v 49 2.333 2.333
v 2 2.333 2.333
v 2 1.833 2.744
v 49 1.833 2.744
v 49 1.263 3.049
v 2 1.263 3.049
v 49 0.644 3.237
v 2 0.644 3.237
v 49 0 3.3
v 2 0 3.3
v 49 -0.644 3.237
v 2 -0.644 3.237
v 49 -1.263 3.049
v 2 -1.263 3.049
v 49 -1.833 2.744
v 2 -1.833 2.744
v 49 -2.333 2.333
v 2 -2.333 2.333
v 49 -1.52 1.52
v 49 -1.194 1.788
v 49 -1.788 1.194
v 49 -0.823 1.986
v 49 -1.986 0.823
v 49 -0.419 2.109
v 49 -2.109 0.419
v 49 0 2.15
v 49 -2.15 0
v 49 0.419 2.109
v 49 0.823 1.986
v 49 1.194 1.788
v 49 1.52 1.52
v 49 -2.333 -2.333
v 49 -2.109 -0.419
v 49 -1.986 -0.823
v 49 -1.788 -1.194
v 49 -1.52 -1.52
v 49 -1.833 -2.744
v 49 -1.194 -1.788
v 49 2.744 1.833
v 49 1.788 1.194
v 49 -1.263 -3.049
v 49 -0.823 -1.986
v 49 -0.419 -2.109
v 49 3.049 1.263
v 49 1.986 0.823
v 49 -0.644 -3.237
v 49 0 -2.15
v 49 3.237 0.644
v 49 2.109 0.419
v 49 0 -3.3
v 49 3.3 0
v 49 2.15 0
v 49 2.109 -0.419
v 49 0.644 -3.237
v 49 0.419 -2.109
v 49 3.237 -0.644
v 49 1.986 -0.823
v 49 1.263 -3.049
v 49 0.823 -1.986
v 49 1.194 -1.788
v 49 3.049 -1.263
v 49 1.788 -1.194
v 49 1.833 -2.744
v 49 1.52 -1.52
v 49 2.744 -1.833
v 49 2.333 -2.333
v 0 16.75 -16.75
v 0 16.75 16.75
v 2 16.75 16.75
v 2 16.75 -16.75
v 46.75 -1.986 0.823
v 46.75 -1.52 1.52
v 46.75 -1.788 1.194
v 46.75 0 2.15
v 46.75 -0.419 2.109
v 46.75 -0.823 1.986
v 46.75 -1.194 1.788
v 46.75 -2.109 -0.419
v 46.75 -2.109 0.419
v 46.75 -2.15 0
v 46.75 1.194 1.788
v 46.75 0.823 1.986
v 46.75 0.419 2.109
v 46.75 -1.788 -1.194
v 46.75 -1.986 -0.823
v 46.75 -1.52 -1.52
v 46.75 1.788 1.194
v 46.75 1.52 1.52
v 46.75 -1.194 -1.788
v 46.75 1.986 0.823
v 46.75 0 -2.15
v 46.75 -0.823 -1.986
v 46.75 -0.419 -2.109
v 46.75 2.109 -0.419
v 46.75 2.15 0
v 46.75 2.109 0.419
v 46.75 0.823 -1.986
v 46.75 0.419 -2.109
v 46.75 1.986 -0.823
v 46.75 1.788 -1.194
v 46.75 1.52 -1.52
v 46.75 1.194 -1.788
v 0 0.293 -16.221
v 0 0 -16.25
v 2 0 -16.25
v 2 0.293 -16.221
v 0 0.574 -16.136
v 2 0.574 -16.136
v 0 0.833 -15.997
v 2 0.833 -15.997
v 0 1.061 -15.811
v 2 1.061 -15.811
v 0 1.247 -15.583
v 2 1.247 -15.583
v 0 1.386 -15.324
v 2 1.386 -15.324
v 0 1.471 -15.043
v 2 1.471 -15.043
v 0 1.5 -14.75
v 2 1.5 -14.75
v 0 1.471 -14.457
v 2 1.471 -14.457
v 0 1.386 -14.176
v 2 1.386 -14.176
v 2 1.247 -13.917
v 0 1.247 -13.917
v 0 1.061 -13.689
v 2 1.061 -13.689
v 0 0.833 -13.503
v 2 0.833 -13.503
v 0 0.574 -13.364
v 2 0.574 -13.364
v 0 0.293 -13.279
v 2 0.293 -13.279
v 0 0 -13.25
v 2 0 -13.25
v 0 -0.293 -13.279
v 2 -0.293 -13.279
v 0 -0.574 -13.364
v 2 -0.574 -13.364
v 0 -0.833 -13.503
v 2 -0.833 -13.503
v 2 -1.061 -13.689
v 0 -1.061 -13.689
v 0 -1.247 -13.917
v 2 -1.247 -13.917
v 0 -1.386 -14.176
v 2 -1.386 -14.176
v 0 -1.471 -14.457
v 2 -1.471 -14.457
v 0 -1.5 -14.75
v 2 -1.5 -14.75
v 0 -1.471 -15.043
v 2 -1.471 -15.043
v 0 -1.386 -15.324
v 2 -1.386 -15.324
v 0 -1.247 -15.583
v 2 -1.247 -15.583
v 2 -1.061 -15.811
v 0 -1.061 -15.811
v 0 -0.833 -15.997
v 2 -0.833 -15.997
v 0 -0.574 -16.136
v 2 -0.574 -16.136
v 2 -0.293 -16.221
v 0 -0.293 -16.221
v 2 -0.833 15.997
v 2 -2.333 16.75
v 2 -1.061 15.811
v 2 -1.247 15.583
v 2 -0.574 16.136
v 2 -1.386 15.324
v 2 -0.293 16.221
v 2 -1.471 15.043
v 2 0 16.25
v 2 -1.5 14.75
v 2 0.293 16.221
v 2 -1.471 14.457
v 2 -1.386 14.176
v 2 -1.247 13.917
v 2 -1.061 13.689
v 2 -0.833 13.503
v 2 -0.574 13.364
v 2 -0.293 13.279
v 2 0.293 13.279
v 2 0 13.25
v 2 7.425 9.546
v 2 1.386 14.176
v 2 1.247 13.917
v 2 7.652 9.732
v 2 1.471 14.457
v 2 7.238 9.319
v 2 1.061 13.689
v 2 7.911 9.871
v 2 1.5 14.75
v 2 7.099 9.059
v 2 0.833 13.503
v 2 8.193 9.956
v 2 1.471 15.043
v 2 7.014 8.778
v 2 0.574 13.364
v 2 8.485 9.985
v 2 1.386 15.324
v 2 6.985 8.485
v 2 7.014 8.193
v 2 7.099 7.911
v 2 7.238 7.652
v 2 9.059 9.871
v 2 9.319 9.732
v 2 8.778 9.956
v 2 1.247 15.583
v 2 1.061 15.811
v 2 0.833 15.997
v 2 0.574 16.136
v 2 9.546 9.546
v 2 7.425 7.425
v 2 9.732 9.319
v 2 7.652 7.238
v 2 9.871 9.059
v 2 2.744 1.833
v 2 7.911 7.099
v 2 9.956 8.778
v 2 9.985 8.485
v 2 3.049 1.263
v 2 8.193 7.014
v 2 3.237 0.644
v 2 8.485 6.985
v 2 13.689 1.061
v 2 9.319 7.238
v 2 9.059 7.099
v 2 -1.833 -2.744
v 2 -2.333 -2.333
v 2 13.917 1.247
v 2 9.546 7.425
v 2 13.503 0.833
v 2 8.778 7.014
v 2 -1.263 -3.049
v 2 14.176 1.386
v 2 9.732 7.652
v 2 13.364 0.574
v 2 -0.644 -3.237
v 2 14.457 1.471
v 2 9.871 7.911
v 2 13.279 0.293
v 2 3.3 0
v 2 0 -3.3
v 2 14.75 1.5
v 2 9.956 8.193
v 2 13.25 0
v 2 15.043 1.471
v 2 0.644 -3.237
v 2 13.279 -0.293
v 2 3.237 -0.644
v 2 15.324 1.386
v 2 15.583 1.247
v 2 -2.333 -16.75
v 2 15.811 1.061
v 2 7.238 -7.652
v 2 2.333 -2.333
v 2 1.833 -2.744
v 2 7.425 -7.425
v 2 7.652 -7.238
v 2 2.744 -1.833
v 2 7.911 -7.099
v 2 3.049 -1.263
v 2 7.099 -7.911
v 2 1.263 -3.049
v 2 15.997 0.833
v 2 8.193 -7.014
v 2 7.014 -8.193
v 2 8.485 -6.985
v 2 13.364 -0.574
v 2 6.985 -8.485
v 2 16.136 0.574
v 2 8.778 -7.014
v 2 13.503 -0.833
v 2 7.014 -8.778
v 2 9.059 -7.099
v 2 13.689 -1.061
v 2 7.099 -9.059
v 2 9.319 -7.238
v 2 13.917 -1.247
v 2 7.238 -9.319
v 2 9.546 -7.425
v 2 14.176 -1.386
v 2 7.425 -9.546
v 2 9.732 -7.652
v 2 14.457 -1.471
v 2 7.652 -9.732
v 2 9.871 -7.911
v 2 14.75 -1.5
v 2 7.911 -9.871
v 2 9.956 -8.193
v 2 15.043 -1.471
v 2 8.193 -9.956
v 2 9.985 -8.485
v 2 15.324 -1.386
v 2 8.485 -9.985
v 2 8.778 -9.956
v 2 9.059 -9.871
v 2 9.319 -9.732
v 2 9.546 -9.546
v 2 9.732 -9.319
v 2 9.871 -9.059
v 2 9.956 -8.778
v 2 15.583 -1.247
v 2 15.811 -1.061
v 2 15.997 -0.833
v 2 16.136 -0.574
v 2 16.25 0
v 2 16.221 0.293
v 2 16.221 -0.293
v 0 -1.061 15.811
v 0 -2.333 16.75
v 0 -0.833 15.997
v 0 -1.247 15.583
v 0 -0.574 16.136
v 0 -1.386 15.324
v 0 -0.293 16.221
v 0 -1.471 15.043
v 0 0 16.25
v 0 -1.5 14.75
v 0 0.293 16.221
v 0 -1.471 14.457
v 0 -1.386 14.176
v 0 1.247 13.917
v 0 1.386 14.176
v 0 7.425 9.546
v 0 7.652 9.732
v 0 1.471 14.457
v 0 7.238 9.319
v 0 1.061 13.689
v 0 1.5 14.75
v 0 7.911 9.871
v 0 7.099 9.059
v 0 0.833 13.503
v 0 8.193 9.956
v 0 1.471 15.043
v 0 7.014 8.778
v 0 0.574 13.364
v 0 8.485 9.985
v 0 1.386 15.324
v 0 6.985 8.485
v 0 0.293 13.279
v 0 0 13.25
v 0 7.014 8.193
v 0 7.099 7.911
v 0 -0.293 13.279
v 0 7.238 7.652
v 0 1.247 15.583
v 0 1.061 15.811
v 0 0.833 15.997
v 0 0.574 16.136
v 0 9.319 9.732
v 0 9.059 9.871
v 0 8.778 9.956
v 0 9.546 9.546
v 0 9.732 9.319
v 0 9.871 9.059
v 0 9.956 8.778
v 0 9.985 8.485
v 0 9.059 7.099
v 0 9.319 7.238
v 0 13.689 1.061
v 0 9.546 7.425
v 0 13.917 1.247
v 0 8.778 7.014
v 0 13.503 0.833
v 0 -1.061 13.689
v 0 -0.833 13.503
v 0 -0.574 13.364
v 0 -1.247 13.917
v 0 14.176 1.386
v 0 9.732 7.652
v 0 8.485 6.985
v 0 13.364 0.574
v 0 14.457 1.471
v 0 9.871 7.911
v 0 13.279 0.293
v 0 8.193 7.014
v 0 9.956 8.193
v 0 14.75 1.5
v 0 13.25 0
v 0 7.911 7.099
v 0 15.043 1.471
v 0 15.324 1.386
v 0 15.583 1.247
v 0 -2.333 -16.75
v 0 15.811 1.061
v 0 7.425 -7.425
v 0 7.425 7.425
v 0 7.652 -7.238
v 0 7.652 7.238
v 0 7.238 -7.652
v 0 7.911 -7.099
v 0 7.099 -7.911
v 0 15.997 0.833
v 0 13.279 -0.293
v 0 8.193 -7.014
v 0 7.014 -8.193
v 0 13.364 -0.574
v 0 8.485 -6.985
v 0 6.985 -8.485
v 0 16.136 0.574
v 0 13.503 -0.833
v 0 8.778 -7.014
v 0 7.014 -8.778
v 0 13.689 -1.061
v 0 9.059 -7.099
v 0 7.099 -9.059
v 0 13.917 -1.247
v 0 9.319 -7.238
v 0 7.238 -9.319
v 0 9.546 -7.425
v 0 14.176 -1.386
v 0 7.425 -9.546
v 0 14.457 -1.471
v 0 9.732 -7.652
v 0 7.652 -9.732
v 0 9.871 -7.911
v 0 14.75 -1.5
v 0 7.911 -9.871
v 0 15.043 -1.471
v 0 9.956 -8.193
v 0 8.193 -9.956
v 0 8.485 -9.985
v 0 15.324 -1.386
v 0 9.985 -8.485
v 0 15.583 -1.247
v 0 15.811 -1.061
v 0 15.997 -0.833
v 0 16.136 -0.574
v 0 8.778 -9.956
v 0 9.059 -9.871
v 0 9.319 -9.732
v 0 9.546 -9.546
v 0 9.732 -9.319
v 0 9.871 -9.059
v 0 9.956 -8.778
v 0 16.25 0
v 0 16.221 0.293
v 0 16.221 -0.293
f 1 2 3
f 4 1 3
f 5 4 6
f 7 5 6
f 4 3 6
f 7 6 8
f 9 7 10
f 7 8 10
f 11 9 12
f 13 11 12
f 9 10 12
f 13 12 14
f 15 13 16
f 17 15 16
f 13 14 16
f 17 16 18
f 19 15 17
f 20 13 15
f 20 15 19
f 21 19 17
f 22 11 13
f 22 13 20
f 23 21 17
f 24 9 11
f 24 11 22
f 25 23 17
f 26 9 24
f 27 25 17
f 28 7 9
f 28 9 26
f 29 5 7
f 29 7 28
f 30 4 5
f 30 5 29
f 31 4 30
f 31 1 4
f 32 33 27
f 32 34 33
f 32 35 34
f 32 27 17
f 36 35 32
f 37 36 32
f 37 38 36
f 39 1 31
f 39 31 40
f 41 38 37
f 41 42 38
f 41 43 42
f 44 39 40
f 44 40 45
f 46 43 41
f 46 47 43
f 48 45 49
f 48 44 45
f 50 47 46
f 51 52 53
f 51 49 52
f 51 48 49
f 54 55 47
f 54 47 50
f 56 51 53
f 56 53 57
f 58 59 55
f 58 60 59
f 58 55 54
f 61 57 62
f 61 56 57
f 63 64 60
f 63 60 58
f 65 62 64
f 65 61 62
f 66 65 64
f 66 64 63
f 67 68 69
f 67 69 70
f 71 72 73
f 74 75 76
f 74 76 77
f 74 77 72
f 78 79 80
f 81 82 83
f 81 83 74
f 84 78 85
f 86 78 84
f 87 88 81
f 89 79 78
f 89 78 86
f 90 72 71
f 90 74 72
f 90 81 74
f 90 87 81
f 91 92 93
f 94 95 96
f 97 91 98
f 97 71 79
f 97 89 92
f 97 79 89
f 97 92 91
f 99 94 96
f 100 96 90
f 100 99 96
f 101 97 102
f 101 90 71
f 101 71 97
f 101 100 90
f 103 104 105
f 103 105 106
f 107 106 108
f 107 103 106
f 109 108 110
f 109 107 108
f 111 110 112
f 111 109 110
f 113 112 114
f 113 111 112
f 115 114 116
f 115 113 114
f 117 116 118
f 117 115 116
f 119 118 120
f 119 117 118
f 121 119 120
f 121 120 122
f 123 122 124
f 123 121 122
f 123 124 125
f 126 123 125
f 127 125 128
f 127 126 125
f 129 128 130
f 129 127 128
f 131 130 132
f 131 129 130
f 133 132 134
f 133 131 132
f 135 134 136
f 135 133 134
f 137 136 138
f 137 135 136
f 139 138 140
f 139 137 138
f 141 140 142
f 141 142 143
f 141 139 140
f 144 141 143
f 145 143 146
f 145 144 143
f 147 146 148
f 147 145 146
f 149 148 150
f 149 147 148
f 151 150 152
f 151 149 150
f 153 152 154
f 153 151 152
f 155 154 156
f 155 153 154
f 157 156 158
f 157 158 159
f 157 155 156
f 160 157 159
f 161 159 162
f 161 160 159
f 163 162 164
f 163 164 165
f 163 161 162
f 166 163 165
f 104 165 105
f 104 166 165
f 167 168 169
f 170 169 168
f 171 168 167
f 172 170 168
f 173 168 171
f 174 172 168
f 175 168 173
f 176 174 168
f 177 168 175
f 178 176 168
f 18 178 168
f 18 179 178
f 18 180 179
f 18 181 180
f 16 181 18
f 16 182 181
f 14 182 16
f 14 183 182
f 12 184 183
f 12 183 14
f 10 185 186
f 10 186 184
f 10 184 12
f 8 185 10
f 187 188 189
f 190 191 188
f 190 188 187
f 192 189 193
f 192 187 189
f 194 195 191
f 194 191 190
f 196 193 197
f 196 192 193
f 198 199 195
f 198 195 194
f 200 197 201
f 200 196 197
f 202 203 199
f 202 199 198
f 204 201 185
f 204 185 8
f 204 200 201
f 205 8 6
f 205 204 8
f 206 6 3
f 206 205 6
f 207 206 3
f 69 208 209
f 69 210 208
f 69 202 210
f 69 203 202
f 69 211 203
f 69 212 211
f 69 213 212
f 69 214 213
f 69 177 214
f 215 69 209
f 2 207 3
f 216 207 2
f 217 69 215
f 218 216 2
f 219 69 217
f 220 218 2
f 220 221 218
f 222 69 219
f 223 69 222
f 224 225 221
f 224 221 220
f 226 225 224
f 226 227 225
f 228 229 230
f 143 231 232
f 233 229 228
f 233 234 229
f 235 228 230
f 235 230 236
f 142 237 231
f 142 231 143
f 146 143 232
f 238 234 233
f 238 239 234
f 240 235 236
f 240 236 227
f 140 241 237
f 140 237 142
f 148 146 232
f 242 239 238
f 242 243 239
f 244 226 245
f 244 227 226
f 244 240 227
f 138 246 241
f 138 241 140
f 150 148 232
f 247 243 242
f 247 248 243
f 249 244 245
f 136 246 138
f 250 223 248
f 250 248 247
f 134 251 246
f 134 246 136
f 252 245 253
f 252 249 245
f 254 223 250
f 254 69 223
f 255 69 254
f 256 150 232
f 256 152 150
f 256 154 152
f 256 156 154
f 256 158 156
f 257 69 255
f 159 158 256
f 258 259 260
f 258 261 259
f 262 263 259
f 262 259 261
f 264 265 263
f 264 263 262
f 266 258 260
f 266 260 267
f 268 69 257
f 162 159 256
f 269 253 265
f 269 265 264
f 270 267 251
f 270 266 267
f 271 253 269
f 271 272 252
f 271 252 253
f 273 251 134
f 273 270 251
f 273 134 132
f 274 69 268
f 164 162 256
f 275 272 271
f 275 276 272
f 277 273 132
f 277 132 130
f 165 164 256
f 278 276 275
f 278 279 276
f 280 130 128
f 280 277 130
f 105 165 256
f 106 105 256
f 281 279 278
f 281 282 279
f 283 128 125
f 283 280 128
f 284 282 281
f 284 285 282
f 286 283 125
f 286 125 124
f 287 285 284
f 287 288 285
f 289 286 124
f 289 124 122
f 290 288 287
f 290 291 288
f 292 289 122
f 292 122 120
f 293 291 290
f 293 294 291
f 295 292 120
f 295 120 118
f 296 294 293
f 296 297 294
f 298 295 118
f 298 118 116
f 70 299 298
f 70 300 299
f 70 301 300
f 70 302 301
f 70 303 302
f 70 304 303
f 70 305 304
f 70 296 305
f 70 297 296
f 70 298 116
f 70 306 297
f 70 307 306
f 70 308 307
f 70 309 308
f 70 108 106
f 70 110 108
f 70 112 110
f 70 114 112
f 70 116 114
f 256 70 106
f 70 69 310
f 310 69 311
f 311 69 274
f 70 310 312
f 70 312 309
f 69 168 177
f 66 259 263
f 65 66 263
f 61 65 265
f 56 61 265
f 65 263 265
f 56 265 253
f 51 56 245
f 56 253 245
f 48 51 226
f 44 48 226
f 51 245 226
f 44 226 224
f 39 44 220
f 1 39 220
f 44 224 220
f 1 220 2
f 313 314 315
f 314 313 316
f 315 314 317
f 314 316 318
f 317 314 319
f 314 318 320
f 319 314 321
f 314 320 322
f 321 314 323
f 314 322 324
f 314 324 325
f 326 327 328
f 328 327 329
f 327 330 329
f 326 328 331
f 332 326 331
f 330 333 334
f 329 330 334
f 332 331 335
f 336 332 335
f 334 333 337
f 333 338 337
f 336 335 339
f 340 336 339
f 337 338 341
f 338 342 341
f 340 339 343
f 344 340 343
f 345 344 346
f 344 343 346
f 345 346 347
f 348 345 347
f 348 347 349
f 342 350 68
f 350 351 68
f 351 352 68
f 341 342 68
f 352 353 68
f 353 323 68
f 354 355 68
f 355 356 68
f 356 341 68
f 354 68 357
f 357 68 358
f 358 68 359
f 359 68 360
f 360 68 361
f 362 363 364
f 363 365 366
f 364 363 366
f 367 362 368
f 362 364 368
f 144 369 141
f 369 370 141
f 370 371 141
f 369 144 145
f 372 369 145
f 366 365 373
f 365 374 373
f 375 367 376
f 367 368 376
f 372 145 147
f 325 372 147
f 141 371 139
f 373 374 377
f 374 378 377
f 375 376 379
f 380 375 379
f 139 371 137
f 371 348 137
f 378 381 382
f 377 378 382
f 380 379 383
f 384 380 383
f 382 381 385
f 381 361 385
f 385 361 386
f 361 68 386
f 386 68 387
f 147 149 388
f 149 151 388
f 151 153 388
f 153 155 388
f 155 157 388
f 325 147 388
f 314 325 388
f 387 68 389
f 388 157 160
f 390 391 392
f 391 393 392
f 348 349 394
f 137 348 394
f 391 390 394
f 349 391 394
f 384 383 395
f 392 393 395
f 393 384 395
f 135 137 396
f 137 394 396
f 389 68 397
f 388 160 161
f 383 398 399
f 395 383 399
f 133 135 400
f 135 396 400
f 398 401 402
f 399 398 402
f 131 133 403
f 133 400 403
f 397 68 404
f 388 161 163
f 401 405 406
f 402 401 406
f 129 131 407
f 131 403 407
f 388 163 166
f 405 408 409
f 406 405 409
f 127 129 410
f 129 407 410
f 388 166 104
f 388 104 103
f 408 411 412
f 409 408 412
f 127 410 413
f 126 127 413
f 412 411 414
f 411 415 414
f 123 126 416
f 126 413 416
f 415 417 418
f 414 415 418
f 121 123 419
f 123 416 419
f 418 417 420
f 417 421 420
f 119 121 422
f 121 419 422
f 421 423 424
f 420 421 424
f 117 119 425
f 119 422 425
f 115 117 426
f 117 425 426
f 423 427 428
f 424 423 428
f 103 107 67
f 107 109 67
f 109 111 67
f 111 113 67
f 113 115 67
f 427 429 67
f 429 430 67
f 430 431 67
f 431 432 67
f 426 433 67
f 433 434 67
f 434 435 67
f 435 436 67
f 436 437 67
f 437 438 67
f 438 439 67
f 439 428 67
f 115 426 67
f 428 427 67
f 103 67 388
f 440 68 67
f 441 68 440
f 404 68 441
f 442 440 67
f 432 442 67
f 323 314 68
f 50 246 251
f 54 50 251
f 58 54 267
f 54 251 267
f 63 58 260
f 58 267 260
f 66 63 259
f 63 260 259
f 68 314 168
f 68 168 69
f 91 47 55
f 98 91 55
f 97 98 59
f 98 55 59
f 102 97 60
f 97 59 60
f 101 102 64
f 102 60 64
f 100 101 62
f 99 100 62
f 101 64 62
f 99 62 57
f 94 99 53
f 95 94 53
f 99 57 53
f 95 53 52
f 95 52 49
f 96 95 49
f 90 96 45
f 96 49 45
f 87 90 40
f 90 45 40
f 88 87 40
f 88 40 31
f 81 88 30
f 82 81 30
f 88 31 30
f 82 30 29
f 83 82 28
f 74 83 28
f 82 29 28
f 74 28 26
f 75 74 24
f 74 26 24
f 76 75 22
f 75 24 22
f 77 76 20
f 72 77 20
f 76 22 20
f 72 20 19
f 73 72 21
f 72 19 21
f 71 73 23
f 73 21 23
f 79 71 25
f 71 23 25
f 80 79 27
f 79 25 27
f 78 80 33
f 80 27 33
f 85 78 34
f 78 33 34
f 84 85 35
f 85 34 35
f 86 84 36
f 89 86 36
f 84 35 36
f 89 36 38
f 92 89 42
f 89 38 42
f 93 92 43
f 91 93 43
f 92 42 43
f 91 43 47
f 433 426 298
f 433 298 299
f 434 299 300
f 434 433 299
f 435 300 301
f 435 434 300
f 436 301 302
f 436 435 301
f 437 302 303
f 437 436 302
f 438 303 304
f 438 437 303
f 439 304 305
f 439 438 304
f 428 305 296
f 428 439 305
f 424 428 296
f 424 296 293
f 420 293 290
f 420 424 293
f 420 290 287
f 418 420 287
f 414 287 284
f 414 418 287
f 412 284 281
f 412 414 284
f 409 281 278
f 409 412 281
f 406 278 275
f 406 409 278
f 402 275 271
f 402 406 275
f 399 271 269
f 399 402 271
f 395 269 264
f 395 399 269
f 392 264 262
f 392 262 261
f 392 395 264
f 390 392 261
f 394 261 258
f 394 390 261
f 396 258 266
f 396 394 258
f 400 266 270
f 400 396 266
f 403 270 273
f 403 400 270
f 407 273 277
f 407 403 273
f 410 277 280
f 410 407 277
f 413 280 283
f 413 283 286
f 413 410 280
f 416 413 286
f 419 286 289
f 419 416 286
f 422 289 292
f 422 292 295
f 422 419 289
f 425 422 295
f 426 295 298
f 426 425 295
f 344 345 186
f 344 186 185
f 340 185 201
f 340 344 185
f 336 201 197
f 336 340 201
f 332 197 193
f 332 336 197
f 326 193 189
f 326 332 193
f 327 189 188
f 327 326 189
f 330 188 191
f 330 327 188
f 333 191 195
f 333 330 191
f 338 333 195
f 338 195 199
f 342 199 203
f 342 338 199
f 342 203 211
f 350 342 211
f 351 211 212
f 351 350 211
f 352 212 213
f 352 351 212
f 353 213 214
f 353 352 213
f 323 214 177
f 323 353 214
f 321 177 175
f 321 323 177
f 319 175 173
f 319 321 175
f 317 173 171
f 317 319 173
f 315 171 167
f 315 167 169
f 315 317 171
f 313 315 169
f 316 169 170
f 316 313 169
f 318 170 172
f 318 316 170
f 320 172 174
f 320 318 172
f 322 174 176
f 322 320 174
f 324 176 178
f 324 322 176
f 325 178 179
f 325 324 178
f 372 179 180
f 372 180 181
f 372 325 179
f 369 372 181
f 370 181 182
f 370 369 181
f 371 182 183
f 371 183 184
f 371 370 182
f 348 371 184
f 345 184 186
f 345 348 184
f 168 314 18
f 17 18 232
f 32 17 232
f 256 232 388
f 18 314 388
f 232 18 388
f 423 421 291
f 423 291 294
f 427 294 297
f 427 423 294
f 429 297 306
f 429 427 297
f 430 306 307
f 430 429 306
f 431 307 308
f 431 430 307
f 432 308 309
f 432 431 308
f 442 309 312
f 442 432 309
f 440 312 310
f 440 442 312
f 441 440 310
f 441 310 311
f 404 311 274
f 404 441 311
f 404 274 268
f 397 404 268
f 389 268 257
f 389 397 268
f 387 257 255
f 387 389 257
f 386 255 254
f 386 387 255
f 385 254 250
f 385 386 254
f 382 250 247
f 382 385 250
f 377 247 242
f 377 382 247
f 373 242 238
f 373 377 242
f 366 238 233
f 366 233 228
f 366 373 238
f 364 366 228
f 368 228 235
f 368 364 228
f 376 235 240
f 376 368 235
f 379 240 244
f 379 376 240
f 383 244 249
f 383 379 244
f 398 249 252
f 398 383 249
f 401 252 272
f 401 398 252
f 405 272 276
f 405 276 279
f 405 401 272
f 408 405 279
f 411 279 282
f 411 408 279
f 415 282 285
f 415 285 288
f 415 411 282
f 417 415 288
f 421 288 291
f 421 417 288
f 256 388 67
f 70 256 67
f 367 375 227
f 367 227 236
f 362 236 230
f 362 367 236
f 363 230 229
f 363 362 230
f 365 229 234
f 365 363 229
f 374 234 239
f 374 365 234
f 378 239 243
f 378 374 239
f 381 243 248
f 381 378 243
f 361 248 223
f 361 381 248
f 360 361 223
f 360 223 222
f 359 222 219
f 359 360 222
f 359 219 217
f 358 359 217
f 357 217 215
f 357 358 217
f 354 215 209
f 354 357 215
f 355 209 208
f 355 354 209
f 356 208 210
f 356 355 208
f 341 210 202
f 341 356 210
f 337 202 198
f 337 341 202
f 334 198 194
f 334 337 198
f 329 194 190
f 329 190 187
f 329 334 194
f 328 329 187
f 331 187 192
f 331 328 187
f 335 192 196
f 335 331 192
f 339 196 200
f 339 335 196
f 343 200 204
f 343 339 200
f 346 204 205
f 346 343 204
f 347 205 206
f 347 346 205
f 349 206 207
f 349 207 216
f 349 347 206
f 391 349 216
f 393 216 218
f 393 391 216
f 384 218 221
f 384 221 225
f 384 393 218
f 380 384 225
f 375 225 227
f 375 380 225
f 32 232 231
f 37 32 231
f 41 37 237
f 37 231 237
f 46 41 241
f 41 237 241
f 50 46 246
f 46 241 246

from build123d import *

# Parameters (mm, degrees)
SKETCH1_W           = 33.5
SKETCH1_H           = 19.083452378
SKETCH1_R           = 1.5
BOSS_EXTRUDE1_DEPTH = 2
BOSS_EXTRUDE2_DEPTH = 49
SKETCH3_R           = 2.15
CUT_EXTRUDE1_DEPTH  = 2.25


with BuildPart() as part:
    # Sketch1 → Boss-Extrude1 (new body)
    with BuildSketch(Plane(origin=(0, 0, 0), x_dir=(0, 0, -1), z_dir=(1, 0, 0))):
        with Locations((0, 7.208273811)):
            Rectangle(SKETCH1_W, SKETCH1_H)
        with Locations((-14.75, 0)):
            Circle(SKETCH1_R, mode=Mode.SUBTRACT)
        with Locations((14.75, 0)):
            Circle(SKETCH1_R, mode=Mode.SUBTRACT)
        with Locations((-8.485281374, 8.485281374)):
            Circle(SKETCH1_R, mode=Mode.SUBTRACT)
        with Locations((8.485281374, 8.485281374)):
            Circle(SKETCH1_R, mode=Mode.SUBTRACT)
        with Locations((0, 14.75)):
            Circle(SKETCH1_R, mode=Mode.SUBTRACT)
    extrude(amount=BOSS_EXTRUDE1_DEPTH)

    # Sketch1<3> → Boss-Extrude2 (add)
    with BuildSketch(Plane(origin=(0, 0, 0), x_dir=(0, 0, -1), z_dir=(1, 0, 0))):
        with BuildLine():
            Line((-2.333452378, -2.333452378), (2.333452378, -2.333452378))
            ThreePointArc((2.333452378, -2.333452378), (0, 3.3), (-2.333452378, -2.333452378))
        make_face()
    extrude(amount=BOSS_EXTRUDE2_DEPTH)

    # Sketch3 → Cut-Extrude1 (cut)
    with BuildSketch(Plane(origin=(49, 0, 0), x_dir=(0, 0, -1), z_dir=(1, 0, 0))):
        Circle(SKETCH3_R)
    extrude(amount=-CUT_EXTRUDE1_DEPTH, mode=Mode.SUBTRACT)


solid = part.part
